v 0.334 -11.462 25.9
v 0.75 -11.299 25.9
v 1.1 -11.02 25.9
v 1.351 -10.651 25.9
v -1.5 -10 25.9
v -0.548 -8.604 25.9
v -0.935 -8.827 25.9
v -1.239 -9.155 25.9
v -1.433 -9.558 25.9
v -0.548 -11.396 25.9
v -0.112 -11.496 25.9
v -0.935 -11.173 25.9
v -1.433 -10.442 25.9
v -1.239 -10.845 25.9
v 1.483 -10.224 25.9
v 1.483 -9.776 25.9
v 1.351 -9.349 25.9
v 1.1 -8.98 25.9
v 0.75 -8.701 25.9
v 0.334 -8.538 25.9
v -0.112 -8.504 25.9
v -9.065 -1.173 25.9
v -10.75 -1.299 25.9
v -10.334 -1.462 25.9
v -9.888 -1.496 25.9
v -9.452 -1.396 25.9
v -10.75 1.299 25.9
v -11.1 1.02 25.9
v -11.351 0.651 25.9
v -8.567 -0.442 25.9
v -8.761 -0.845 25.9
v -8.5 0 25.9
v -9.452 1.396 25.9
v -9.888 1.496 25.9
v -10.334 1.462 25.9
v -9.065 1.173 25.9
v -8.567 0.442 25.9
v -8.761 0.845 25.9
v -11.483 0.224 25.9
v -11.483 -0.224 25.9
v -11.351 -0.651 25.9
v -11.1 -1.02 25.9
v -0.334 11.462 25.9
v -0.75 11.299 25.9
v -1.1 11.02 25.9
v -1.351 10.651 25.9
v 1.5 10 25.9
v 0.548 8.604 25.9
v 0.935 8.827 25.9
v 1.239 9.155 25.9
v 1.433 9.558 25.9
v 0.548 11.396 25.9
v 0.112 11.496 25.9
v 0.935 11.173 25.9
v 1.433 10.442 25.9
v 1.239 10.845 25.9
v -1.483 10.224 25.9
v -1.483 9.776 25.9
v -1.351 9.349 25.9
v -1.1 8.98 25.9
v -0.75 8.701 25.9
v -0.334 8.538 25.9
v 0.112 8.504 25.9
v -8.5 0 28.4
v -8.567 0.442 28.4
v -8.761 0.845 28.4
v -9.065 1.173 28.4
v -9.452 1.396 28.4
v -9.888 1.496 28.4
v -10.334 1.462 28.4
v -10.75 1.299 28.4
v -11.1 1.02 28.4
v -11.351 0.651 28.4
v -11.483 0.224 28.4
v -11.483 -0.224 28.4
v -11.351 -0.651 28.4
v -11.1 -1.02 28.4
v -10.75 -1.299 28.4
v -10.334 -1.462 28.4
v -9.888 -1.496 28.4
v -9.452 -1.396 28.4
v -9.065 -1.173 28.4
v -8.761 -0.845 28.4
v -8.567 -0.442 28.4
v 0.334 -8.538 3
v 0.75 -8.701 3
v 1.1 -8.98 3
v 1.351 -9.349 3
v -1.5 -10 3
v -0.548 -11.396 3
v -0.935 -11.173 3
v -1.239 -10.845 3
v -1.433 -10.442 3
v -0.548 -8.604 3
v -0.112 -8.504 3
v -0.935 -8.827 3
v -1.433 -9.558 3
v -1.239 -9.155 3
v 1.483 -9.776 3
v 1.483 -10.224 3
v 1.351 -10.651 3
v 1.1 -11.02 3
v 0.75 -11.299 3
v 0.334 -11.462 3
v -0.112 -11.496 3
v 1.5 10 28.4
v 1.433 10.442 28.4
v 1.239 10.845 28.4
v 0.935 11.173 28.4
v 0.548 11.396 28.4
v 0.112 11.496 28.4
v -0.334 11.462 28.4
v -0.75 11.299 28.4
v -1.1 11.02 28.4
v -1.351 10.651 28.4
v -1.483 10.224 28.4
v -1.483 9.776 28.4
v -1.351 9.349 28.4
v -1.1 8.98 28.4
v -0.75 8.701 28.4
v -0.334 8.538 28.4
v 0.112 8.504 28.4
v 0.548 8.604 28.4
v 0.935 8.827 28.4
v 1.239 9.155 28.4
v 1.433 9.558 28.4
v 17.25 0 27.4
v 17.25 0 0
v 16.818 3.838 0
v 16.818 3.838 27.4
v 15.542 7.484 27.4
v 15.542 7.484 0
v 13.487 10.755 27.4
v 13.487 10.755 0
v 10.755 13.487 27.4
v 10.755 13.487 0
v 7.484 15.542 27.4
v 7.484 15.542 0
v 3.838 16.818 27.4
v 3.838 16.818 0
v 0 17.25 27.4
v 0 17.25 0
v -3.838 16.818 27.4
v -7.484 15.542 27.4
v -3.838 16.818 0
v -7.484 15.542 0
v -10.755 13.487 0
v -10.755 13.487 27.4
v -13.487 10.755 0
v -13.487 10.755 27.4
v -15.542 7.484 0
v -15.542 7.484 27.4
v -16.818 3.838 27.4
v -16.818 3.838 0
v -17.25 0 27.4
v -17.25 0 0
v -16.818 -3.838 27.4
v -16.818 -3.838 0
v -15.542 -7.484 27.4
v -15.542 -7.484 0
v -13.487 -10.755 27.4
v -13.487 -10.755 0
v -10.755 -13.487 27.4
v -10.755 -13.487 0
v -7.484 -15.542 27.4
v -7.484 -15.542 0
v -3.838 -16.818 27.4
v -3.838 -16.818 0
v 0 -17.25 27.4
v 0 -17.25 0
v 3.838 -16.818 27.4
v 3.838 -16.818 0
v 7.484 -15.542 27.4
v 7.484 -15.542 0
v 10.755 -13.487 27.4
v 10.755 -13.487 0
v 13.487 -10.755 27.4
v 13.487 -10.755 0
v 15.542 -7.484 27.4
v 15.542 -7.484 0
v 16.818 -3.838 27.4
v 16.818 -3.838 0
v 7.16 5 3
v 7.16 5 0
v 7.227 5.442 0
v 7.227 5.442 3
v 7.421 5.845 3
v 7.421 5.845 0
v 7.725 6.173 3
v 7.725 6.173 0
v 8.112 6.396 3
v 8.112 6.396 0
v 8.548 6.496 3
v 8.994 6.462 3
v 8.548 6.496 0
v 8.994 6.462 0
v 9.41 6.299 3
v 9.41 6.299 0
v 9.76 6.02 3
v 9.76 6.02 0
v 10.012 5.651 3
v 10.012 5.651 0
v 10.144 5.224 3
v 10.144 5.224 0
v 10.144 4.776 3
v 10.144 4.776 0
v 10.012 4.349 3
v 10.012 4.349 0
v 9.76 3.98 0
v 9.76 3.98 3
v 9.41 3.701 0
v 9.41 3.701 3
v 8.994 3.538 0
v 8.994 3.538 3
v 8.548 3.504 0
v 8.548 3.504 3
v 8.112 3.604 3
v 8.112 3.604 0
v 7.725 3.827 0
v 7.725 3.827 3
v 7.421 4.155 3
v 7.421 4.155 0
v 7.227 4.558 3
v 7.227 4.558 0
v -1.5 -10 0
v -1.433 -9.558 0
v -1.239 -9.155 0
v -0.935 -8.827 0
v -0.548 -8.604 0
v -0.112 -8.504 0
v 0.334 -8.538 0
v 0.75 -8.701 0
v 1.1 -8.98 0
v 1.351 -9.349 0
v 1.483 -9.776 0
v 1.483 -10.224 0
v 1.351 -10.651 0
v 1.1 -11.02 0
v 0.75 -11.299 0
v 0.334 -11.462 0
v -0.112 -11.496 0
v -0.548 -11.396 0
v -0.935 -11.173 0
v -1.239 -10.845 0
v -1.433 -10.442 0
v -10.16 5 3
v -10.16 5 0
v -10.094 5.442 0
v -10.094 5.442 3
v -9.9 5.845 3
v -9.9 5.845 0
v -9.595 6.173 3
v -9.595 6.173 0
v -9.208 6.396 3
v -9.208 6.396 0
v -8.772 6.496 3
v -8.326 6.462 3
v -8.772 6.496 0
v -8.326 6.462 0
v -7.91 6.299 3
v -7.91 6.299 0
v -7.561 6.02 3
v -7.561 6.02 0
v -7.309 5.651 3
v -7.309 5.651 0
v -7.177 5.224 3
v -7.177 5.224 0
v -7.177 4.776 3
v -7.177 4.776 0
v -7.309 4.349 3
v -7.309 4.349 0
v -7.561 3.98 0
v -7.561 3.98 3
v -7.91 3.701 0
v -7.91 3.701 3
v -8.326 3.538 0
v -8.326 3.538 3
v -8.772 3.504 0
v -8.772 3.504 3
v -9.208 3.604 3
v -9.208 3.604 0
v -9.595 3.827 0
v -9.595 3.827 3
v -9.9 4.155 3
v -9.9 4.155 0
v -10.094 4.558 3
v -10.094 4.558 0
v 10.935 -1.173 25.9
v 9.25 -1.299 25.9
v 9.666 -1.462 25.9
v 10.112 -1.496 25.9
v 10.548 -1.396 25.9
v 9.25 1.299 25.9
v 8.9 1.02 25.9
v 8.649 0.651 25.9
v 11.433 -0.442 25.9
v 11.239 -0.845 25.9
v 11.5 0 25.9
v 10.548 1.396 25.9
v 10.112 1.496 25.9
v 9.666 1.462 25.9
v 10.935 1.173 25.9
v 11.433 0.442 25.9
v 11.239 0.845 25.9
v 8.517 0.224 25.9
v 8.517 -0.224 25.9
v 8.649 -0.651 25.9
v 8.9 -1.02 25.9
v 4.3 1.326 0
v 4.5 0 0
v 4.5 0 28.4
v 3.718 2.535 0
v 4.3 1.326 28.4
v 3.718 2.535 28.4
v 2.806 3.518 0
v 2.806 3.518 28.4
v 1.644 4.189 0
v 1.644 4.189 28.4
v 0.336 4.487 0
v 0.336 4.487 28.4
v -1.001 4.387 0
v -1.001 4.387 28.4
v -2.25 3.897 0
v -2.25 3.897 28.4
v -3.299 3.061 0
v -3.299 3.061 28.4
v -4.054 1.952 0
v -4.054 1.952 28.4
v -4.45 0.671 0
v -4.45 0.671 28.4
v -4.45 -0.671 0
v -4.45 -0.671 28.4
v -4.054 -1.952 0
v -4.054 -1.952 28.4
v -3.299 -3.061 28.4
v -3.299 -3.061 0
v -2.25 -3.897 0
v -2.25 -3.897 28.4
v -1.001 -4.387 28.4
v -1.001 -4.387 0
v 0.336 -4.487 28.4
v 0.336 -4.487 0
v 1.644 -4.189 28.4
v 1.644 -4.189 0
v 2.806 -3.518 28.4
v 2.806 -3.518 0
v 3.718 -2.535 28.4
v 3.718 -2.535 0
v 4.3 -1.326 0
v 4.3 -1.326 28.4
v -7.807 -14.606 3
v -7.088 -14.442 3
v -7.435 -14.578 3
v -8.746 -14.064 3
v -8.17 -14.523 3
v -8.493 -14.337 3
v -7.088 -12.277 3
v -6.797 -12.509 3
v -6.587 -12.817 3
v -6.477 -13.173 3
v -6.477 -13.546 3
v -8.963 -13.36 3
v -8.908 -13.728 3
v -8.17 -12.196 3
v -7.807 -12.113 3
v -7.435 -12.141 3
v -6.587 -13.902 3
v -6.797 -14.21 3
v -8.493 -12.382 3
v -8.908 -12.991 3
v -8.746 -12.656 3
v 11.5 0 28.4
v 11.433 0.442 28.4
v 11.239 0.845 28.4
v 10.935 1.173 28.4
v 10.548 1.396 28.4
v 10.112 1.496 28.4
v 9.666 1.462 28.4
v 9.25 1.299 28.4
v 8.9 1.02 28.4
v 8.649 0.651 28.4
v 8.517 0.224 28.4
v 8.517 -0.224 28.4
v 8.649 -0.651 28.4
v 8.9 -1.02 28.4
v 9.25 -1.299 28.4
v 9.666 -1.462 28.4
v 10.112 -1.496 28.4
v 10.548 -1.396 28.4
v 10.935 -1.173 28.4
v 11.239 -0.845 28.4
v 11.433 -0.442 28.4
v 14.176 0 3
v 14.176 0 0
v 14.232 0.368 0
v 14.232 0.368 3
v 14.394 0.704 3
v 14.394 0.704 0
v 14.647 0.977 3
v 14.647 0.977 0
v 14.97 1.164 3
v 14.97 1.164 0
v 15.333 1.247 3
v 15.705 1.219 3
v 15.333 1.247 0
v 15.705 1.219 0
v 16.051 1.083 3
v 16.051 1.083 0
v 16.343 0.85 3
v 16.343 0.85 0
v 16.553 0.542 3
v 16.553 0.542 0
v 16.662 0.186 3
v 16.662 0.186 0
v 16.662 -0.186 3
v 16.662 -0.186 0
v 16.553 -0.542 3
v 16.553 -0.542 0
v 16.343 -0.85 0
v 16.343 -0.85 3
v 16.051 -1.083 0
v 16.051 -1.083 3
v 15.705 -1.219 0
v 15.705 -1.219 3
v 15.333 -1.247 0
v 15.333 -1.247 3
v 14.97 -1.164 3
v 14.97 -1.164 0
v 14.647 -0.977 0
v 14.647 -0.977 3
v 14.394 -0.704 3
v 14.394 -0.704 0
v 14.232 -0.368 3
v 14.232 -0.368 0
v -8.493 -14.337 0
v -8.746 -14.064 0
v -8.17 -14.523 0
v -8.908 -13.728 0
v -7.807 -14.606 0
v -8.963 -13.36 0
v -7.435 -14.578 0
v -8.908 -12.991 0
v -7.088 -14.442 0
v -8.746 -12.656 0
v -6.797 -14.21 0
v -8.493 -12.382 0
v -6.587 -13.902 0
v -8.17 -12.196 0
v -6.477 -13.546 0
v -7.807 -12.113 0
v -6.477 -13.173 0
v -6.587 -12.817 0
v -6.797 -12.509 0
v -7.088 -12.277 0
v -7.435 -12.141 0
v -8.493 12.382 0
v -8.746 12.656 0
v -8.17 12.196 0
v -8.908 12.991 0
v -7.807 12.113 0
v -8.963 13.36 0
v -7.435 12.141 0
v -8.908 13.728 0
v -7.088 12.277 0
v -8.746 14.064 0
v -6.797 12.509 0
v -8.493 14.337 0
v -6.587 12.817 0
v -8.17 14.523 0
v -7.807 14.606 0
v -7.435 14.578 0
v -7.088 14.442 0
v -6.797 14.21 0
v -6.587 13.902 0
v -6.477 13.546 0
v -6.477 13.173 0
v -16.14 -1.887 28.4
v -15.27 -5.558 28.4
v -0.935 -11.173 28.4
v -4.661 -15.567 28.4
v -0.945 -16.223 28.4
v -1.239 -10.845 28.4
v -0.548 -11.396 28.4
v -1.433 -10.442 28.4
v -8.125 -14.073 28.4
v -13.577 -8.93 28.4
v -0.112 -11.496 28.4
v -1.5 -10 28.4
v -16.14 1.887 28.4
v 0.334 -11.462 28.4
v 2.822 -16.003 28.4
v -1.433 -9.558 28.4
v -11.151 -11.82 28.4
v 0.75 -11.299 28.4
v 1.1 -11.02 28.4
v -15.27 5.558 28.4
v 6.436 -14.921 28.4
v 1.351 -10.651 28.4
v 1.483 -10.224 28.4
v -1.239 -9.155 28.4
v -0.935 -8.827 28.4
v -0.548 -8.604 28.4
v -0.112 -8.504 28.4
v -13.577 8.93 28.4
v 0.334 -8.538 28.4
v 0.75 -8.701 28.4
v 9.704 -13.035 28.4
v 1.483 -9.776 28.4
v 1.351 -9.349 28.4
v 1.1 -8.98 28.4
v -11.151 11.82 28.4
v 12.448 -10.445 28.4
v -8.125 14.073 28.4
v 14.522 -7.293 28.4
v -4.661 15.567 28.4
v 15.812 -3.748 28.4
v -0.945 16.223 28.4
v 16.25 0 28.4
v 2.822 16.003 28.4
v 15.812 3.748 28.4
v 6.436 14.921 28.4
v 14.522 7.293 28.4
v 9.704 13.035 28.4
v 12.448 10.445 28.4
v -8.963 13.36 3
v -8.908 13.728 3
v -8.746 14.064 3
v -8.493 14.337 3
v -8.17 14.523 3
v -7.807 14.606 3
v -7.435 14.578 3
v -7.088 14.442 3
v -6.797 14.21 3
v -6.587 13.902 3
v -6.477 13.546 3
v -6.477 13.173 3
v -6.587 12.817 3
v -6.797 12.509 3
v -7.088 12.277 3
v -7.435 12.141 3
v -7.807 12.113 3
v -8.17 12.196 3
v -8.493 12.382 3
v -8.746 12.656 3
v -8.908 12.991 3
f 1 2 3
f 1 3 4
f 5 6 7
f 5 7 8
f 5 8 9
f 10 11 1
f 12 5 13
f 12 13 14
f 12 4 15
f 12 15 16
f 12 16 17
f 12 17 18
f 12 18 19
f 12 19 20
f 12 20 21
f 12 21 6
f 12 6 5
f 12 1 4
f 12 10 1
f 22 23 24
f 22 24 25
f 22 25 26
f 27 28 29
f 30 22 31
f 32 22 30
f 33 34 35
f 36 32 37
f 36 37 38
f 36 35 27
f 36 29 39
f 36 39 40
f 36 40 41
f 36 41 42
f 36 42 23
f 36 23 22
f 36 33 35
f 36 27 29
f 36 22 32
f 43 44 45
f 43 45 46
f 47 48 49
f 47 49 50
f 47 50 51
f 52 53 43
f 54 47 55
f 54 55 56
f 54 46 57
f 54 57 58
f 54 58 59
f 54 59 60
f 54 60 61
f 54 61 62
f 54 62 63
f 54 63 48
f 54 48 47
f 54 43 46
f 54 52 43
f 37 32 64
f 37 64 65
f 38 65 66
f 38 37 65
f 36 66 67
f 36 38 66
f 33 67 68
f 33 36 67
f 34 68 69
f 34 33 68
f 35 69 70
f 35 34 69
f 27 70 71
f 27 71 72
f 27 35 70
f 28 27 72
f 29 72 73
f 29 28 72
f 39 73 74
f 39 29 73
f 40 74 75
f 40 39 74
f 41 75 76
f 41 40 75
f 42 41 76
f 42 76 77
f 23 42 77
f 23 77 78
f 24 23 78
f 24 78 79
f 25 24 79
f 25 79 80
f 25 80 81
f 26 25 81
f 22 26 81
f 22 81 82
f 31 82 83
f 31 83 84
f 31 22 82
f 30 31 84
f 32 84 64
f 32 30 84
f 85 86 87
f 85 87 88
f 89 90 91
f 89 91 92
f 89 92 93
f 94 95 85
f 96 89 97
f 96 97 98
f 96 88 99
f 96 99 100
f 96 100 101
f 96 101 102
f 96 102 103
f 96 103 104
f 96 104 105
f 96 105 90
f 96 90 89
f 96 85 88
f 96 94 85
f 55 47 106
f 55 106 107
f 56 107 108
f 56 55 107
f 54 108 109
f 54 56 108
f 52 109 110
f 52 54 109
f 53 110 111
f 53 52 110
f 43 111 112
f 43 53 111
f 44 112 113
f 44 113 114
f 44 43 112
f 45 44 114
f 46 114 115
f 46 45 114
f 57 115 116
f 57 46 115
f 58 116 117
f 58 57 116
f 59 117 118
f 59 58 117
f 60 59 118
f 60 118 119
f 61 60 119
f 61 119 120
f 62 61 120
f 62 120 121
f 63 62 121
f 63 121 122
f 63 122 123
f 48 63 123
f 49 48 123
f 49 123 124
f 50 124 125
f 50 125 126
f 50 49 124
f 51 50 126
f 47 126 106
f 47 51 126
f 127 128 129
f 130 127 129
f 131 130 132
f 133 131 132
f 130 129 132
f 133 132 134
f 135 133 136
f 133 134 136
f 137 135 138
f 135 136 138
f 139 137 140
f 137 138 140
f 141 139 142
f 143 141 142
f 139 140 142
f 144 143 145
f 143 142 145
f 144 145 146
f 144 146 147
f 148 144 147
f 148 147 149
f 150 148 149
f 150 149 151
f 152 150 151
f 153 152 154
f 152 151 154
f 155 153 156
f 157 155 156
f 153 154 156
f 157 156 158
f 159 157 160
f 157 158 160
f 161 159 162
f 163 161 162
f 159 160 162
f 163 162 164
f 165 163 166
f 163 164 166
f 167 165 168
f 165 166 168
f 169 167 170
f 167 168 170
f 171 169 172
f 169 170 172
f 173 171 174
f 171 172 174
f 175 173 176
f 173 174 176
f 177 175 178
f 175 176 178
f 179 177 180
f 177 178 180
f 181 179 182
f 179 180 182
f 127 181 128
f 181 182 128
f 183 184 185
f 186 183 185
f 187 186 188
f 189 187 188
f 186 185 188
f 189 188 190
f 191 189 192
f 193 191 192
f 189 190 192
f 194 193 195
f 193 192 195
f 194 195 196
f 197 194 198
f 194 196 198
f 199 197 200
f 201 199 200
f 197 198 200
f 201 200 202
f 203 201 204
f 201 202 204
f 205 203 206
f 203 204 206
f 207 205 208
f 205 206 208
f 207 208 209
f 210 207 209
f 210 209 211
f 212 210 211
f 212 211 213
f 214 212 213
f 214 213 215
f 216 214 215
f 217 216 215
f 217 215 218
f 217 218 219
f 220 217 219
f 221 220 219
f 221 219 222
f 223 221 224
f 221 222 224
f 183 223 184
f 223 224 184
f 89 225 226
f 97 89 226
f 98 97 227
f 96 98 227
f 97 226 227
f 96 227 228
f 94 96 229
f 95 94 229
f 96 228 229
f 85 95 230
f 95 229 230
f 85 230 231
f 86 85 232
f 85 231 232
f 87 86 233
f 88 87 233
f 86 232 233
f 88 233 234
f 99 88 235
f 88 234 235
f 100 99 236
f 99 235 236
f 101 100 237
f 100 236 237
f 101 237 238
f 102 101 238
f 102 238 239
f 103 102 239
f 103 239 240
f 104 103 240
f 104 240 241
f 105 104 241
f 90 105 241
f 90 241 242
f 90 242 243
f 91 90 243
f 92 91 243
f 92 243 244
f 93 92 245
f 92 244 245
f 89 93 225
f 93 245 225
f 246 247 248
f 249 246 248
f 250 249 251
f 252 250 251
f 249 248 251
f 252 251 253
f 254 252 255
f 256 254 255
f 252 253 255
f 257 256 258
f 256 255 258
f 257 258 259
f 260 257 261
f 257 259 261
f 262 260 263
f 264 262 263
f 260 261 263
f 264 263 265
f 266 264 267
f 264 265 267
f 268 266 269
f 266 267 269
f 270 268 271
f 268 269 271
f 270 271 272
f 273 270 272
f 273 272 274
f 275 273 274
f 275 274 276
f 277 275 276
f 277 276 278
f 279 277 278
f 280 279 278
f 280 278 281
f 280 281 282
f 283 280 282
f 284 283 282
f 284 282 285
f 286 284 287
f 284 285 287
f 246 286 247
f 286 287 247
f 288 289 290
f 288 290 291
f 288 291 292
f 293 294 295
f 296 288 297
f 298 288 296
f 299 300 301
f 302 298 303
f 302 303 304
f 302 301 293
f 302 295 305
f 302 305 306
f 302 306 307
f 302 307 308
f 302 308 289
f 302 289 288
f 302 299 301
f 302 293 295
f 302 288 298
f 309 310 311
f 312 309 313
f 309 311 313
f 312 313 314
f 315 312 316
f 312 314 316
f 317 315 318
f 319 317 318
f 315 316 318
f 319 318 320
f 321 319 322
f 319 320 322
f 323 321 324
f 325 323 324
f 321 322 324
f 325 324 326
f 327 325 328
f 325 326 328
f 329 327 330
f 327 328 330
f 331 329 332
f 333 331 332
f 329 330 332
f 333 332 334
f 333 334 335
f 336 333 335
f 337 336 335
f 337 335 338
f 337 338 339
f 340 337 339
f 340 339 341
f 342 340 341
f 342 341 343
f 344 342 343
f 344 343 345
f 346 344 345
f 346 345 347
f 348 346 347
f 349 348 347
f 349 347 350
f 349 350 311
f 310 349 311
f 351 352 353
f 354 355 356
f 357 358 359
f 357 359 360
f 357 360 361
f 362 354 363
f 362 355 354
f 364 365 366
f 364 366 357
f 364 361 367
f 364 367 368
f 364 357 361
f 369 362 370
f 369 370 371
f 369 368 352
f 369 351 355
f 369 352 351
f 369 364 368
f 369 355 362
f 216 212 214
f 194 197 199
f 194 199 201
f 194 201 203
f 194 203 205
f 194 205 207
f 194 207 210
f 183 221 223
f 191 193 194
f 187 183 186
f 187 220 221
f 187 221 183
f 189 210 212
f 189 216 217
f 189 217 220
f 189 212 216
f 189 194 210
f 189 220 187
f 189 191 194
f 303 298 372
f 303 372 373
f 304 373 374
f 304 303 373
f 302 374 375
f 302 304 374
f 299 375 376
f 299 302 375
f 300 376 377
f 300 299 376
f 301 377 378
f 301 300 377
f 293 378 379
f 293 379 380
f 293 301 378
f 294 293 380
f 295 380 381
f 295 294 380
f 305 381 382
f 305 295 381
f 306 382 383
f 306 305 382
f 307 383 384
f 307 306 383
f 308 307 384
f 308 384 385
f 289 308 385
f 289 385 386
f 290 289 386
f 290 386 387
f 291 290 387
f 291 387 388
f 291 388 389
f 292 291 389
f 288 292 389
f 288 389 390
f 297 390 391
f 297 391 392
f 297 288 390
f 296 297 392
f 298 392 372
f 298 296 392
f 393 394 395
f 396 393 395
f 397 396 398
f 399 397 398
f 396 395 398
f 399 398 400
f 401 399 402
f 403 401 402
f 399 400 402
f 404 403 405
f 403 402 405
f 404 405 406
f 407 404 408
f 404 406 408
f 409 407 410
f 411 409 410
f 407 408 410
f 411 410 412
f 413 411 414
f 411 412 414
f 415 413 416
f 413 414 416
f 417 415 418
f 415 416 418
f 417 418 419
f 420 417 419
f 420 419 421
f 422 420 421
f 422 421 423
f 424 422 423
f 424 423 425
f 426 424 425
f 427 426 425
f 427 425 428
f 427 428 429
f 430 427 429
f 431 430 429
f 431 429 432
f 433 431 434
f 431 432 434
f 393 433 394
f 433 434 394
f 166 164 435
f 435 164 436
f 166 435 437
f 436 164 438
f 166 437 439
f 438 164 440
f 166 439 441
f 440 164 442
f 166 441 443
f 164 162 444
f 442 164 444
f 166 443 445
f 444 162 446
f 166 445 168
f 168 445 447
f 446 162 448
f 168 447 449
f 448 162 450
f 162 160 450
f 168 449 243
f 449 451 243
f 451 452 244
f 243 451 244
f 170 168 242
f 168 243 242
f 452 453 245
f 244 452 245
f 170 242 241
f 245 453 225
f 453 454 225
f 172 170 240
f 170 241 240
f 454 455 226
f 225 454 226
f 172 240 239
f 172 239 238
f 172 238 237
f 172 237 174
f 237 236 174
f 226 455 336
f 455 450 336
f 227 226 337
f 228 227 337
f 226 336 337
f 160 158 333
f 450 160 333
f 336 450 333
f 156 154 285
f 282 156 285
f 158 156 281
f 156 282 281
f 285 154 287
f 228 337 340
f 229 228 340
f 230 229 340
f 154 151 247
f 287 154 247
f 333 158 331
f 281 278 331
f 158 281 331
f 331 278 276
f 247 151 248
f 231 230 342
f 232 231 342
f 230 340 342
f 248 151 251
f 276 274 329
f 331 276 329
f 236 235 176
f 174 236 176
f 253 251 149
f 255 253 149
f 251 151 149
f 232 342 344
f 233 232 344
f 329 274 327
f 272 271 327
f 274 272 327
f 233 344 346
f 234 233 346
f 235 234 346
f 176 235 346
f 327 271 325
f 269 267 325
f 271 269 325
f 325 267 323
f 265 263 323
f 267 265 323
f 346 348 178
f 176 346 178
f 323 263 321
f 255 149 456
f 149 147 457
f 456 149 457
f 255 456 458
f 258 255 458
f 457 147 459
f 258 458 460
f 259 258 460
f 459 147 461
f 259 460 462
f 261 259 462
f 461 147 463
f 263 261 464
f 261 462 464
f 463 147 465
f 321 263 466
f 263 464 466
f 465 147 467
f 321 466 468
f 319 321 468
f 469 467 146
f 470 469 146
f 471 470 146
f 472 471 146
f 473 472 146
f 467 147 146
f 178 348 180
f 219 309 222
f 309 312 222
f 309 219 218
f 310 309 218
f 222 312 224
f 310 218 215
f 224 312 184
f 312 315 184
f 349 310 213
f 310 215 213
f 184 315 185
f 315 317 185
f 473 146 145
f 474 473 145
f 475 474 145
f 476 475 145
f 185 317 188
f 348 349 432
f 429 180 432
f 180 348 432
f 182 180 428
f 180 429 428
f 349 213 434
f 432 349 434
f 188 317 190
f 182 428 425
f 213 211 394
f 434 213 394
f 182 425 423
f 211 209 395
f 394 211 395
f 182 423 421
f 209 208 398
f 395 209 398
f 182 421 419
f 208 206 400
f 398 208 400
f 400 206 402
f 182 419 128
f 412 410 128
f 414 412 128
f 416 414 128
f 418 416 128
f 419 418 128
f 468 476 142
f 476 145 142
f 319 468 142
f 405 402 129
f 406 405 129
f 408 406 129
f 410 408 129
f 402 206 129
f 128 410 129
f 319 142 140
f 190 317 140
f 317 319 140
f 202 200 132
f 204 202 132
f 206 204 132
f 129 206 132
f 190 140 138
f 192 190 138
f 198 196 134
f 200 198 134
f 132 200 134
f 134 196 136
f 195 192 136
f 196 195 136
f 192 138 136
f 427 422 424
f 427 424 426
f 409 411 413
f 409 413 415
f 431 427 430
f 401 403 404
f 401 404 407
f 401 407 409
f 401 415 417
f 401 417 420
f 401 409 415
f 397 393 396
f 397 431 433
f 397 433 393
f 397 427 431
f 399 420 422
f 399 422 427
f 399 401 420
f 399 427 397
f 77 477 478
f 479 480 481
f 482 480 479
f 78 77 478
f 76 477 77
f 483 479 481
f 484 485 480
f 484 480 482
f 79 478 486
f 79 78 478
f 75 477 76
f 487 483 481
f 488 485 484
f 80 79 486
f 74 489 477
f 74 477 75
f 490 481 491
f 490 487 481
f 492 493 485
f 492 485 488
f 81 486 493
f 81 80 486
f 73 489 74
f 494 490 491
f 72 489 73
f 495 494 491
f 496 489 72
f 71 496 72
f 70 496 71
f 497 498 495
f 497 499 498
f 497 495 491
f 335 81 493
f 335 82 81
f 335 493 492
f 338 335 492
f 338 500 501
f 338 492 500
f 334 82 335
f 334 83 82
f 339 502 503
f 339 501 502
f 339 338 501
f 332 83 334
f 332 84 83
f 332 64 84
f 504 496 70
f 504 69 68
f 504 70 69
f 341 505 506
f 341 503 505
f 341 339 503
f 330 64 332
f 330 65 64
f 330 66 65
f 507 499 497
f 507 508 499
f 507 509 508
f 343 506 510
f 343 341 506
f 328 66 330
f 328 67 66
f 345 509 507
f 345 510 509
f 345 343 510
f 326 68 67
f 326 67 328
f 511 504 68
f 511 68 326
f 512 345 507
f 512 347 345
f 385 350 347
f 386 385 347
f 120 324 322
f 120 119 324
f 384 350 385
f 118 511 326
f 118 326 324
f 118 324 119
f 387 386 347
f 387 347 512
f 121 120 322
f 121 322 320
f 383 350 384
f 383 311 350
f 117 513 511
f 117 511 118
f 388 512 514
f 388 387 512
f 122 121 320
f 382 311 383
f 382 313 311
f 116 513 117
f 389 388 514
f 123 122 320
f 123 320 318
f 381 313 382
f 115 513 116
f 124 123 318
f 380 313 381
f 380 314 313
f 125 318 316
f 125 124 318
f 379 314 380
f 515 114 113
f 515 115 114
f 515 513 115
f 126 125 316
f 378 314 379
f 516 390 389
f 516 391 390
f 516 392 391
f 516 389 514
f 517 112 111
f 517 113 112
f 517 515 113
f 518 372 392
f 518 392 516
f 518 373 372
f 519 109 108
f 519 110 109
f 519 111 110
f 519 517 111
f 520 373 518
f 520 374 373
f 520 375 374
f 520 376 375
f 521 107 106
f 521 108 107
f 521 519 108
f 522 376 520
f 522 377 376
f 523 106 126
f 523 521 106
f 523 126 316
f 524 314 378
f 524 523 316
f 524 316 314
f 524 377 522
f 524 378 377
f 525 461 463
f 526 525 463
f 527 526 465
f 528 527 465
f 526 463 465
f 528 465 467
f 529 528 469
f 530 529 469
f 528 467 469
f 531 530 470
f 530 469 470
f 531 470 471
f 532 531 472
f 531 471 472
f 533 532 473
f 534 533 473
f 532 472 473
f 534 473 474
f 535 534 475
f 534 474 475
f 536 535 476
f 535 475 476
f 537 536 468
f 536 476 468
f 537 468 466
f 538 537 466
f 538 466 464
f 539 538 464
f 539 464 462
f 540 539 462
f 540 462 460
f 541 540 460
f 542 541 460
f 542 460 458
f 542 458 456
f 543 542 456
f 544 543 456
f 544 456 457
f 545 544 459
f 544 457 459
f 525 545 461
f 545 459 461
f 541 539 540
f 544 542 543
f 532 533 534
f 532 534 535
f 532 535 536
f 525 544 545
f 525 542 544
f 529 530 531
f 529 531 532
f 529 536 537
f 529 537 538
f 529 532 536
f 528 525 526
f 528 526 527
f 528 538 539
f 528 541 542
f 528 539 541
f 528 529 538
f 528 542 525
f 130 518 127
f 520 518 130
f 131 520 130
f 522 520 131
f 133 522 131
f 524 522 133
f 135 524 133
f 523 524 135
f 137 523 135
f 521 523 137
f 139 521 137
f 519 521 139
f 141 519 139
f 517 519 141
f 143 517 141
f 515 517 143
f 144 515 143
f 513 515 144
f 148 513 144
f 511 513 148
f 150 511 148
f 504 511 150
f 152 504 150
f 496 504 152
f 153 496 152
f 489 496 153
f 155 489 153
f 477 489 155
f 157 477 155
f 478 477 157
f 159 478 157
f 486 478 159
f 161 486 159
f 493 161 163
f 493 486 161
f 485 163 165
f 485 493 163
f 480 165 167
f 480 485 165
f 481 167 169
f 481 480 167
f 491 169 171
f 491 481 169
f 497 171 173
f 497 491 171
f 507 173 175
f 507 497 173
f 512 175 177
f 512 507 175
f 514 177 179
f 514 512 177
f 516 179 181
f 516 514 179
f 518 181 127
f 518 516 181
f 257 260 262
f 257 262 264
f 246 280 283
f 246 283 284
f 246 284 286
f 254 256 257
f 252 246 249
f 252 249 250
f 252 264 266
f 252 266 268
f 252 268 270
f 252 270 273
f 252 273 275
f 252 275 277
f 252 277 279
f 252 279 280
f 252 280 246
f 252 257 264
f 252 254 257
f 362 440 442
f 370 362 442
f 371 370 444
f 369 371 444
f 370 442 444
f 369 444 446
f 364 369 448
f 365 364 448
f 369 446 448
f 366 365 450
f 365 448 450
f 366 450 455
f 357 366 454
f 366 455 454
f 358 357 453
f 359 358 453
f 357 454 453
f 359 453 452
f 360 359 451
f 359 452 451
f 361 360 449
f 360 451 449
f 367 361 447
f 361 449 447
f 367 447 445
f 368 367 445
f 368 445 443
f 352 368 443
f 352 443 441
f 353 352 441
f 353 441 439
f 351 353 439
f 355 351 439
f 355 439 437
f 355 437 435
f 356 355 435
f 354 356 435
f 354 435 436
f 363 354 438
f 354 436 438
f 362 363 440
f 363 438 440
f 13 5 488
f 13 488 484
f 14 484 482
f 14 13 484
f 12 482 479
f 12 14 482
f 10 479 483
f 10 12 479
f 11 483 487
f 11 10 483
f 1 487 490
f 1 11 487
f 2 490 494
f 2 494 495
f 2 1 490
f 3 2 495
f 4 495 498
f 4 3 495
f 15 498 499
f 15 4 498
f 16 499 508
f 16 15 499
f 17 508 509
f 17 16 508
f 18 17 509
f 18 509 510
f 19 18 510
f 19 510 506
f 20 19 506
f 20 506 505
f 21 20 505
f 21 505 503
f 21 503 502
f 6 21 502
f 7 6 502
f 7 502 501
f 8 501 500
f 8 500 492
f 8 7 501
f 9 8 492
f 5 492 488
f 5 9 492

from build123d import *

# Parameters (mm, degrees)
ESQUISSE1_R             = 17.25
BOSS_EXTRU_1_DEPTH      = 28.4
CHANFREIN1_SIZE         = 1
ESQUISSE2_R             = 1.5
ESQUISSE2_R_2           = 1.25
ENL_V_MAT_EXTRU_1_DEPTH = 3
ENL_V_START             = -2.5
ESQUISSE3_R             = 1.5
ENL_V_MAT_EXTRU_2_DEPTH = 2.5
ESQUISSE4_R             = 4.5
ENL_V_MAT_EXTRU_4_DEPTH = 38.439083856


with BuildPart() as part:
    # Esquisse1 → Boss.-Extru.1 (new body)
    with BuildSketch(Plane.XY):
        Circle(ESQUISSE1_R)
    extrude(amount=BOSS_EXTRU_1_DEPTH)

    # Chanfrein1
    chanfrein1_edges = [part.edges().sort_by_distance(p)[0] for p in [
        (-17.25, 0, 28.4),
    ]]
    chamfer(chanfrein1_edges, length=CHANFREIN1_SIZE)

    # Esquisse2 → Enlèv. mat.-Extru.1 (cut)
    with BuildSketch(Plane(origin=(0, 0, 0), x_dir=(-1, 0, 0), z_dir=(0, 0, -1))):
        with Locations((8.660254038, 5)):
            Circle(ESQUISSE2_R)
        with Locations((0, -10)):
            Circle(ESQUISSE2_R)
        with Locations((-8.660254038, 5)):
            Circle(ESQUISSE2_R)
        with Locations((7.713223432, 13.359694875)):
            Circle(ESQUISSE2_R_2)
        with Locations((7.713223432, -13.359694875)):
            Circle(ESQUISSE2_R_2)
        with Locations((-15.426446864, 0)):
            Circle(ESQUISSE2_R_2)
    extrude(amount=-ENL_V_MAT_EXTRU_1_DEPTH, mode=Mode.SUBTRACT)

    # Esquisse3 → Enlèv. mat.-Extru.2 (cut)
    with BuildSketch(Plane.XY.offset(28.4).offset(ENL_V_START)):
        with Locations((0, 10)):
            Circle(ESQUISSE3_R)
        with Locations((10, 0)):
            Circle(ESQUISSE3_R)
        with Locations(Location((0, -10, 0), (0, 0, 180))):
            Circle(ESQUISSE3_R)
        with Locations((-10, 0)):
            Circle(ESQUISSE3_R)
    extrude(amount=ENL_V_MAT_EXTRU_2_DEPTH, mode=Mode.SUBTRACT)

    # Esquisse4 → Enlèv. mat.-Extru.4 (cut, through all)
    with BuildSketch(Plane.XY.offset(28.4)):
        Circle(ESQUISSE4_R)
    extrude(amount=-ENL_V_MAT_EXTRU_4_DEPTH, mode=Mode.SUBTRACT)


solid = part.part
